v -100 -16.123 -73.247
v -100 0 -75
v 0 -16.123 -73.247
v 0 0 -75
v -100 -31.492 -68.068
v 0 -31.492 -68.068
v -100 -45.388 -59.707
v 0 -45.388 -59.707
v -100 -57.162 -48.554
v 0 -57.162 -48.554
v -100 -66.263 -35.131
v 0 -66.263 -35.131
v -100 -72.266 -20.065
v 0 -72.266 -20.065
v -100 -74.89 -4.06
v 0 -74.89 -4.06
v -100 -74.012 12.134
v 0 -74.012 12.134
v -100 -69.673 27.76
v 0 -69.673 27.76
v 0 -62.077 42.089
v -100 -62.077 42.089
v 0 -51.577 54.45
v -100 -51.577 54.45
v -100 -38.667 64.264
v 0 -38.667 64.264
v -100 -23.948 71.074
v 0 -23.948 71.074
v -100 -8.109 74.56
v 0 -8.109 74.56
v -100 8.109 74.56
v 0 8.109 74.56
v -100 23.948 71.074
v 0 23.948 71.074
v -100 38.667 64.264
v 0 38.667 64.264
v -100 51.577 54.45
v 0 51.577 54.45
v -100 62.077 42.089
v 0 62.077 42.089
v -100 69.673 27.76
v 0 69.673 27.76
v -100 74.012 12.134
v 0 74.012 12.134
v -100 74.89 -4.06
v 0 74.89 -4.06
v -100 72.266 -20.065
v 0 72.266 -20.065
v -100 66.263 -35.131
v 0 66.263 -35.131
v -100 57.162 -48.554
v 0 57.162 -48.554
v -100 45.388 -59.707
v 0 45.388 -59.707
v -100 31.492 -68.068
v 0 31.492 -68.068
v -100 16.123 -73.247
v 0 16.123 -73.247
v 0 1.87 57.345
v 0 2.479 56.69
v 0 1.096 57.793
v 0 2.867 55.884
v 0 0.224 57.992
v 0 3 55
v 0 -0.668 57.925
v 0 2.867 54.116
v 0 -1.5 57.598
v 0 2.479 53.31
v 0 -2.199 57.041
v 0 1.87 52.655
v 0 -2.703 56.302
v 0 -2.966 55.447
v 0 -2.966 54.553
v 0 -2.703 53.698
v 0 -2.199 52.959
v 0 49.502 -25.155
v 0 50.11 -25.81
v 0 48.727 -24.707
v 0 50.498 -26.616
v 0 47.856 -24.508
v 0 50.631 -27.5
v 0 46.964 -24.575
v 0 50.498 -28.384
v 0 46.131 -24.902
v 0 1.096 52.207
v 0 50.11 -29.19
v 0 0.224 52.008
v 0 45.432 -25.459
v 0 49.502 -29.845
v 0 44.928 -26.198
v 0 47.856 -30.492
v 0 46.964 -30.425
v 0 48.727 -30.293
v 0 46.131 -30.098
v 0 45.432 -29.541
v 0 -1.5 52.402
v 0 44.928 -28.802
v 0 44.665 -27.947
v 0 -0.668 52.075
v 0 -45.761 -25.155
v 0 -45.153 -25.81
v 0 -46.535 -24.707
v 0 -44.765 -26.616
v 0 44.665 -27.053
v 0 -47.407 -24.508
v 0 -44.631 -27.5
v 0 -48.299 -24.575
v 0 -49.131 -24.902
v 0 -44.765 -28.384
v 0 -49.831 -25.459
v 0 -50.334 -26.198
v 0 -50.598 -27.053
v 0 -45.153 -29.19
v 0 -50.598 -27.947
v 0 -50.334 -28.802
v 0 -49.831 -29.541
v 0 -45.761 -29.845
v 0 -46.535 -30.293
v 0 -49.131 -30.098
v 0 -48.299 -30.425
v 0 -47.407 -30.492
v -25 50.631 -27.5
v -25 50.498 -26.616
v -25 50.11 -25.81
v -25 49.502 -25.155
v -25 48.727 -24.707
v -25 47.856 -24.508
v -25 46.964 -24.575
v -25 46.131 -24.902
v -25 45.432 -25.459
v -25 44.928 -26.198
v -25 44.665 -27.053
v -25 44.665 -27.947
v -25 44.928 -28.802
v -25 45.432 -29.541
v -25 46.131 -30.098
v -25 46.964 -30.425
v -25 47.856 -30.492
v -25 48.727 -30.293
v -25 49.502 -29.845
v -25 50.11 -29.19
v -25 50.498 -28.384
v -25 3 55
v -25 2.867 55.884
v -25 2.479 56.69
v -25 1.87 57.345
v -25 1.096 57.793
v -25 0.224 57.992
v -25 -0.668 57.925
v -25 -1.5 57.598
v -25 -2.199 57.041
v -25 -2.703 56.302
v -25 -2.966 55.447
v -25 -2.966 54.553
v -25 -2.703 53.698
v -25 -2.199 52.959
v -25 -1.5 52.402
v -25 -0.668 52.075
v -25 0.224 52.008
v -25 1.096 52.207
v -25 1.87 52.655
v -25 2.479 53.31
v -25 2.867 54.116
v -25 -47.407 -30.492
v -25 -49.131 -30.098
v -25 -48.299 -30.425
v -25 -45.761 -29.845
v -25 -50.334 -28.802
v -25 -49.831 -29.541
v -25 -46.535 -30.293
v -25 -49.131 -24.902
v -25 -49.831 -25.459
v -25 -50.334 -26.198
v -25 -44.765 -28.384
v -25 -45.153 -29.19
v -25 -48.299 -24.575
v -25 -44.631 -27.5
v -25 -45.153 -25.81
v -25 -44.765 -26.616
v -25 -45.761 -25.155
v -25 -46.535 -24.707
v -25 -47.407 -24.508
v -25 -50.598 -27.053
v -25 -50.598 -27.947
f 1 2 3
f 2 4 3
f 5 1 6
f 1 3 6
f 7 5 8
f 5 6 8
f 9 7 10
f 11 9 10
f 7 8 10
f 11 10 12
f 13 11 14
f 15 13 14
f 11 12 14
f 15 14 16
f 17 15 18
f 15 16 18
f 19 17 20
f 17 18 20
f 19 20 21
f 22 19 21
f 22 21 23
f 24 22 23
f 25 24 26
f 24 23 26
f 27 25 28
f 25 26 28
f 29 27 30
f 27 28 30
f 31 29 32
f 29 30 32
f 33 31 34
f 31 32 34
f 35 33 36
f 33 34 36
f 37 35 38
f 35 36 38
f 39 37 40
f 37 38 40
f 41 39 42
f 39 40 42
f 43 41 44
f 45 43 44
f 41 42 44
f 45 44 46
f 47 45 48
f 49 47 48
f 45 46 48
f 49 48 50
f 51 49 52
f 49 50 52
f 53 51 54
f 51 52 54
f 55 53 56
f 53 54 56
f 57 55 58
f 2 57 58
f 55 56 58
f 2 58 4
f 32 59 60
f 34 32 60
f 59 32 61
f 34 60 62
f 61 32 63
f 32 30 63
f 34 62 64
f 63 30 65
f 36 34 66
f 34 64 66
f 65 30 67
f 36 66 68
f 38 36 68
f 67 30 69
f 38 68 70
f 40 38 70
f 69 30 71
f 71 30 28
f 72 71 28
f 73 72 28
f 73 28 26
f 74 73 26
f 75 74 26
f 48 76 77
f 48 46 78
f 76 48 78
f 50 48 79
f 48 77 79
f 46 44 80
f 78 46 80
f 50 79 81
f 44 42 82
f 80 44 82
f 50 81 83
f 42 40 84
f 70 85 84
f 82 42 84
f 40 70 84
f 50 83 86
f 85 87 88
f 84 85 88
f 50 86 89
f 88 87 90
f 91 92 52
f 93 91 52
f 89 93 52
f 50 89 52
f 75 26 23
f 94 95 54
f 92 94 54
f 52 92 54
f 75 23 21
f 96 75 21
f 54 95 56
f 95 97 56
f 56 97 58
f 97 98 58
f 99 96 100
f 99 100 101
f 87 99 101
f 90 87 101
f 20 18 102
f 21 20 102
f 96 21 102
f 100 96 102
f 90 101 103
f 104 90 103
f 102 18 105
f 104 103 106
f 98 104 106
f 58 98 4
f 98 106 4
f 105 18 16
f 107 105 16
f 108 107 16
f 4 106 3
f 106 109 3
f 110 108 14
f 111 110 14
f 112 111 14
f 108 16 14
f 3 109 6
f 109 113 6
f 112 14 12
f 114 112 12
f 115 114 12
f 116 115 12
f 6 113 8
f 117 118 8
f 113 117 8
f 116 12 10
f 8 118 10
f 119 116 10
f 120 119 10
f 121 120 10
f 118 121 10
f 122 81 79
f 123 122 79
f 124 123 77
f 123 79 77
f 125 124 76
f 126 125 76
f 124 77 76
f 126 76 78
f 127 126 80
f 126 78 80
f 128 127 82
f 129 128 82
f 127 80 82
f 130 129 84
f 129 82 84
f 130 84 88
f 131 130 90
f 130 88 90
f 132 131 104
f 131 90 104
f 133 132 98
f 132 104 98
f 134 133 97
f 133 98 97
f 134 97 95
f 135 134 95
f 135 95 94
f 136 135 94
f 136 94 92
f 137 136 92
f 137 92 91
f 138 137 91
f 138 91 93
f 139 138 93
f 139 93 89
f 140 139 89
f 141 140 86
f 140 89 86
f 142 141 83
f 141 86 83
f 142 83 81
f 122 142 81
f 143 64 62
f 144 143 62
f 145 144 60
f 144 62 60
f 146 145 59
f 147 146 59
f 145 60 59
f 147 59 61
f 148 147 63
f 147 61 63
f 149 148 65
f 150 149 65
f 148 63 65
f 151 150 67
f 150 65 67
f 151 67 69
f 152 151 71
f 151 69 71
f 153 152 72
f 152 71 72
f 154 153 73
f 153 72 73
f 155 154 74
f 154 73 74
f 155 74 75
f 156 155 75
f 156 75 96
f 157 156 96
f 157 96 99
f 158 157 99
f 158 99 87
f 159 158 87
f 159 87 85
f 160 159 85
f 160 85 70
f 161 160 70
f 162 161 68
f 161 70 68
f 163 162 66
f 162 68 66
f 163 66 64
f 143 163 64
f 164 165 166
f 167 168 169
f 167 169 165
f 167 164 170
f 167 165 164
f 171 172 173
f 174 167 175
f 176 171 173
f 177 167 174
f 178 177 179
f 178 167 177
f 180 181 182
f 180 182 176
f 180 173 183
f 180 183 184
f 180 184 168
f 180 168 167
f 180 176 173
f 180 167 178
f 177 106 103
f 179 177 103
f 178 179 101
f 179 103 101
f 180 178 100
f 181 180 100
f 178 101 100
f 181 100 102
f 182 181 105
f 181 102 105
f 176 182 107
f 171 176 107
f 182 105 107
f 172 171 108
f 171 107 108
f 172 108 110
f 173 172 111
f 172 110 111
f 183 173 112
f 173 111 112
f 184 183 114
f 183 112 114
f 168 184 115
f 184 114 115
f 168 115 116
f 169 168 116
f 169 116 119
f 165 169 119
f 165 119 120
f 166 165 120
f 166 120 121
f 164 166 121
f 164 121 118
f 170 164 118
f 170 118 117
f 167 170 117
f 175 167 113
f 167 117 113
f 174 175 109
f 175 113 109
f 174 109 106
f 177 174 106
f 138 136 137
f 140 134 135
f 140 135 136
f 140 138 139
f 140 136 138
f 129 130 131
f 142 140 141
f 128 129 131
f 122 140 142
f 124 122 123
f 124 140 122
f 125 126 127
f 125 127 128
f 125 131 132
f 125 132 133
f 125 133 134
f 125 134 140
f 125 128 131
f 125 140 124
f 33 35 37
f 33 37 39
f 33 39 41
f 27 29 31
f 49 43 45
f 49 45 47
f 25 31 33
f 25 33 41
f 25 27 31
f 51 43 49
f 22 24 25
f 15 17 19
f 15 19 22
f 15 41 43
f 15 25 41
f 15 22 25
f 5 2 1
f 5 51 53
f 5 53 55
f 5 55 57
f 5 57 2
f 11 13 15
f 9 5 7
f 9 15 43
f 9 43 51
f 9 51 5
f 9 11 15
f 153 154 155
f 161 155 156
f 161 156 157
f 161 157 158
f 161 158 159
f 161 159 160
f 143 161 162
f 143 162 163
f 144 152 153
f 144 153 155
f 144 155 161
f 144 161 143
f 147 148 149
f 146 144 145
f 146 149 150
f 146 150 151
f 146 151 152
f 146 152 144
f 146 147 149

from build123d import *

# Parameters (mm, degrees)
F0_W     = 100
F0_H     = 75
F2_R     = 3
F3_DEPTH = 25


with BuildPart() as f1:
    # F0 (on Front) → F1 (revolve)
    with BuildSketch(Plane.XZ):
        with Locations((-50, -37.5)):
            Rectangle(F0_W, F0_H)
    revolve(axis=Axis((-50, 0, 0), (-1, 0, 0)))

    # F2 (on Right) → F3 (cut)
    with BuildSketch(Plane.YZ):
        with Locations((0, 55)):
            Circle(F2_R)
        with Locations((-47.631397, -27.5)):
            Circle(F2_R)
        with Locations((47.631397, -27.5)):
            Circle(F2_R)
    extrude(amount=-F3_DEPTH, mode=Mode.SUBTRACT)


solid = f1.part
